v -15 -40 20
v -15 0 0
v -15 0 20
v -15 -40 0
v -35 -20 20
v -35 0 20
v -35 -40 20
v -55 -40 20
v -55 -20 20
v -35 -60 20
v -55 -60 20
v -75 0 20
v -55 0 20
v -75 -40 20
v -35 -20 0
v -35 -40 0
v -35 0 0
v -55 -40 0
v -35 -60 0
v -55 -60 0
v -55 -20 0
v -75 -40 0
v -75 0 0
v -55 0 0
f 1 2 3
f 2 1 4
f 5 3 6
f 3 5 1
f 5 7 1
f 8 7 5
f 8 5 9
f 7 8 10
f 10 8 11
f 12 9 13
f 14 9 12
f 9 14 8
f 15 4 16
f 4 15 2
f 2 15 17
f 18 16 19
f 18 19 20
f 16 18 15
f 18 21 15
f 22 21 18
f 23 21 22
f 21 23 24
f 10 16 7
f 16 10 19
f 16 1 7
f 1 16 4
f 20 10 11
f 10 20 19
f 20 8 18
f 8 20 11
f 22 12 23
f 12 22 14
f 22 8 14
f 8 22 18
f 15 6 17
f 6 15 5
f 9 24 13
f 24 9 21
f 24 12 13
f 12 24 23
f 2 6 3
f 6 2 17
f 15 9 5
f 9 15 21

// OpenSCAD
difference() {
  translate([-45.0000000000, -30.0000000000, 10.0000000000]) {
    scale([60.0000000000, 60.0000000000, 20.0000000000]) {
      translate([-0.5000000000, -0.5000000000, -0.5000000000]) {
        cube([1, 1, 1]);
      }
    }
  }
  union() {
    union() {
      translate([-25.0000000000, -50.0000000000, 10.0000000000]) {
        scale([20.0000000000, 20.0000000000, 20.0000000000]) {
          translate([-0.5000000000, -0.5000000000, -0.5000000000]) {
            cube([1, 1, 1]);
          }
        }
      }
      translate([-65.0000000000, -50.0000000000, 10.0000000000]) {
        scale([20.0000000000, 20.0000000000, 20.0000000000]) {
          translate([-0.5000000000, -0.5000000000, -0.5000000000]) {
            cube([1, 1, 1]);
          }
        }
      }
    }
    translate([-45.0000000000, -10.0000000000, 10.0000000000]) {
      scale([20.0000000000, 20.0000000000, 20.0000000000]) {
        translate([-0.5000000000, -0.5000000000, -0.5000000000]) {
          cube([1, 1, 1]);
        }
      }
    }
  }
}
